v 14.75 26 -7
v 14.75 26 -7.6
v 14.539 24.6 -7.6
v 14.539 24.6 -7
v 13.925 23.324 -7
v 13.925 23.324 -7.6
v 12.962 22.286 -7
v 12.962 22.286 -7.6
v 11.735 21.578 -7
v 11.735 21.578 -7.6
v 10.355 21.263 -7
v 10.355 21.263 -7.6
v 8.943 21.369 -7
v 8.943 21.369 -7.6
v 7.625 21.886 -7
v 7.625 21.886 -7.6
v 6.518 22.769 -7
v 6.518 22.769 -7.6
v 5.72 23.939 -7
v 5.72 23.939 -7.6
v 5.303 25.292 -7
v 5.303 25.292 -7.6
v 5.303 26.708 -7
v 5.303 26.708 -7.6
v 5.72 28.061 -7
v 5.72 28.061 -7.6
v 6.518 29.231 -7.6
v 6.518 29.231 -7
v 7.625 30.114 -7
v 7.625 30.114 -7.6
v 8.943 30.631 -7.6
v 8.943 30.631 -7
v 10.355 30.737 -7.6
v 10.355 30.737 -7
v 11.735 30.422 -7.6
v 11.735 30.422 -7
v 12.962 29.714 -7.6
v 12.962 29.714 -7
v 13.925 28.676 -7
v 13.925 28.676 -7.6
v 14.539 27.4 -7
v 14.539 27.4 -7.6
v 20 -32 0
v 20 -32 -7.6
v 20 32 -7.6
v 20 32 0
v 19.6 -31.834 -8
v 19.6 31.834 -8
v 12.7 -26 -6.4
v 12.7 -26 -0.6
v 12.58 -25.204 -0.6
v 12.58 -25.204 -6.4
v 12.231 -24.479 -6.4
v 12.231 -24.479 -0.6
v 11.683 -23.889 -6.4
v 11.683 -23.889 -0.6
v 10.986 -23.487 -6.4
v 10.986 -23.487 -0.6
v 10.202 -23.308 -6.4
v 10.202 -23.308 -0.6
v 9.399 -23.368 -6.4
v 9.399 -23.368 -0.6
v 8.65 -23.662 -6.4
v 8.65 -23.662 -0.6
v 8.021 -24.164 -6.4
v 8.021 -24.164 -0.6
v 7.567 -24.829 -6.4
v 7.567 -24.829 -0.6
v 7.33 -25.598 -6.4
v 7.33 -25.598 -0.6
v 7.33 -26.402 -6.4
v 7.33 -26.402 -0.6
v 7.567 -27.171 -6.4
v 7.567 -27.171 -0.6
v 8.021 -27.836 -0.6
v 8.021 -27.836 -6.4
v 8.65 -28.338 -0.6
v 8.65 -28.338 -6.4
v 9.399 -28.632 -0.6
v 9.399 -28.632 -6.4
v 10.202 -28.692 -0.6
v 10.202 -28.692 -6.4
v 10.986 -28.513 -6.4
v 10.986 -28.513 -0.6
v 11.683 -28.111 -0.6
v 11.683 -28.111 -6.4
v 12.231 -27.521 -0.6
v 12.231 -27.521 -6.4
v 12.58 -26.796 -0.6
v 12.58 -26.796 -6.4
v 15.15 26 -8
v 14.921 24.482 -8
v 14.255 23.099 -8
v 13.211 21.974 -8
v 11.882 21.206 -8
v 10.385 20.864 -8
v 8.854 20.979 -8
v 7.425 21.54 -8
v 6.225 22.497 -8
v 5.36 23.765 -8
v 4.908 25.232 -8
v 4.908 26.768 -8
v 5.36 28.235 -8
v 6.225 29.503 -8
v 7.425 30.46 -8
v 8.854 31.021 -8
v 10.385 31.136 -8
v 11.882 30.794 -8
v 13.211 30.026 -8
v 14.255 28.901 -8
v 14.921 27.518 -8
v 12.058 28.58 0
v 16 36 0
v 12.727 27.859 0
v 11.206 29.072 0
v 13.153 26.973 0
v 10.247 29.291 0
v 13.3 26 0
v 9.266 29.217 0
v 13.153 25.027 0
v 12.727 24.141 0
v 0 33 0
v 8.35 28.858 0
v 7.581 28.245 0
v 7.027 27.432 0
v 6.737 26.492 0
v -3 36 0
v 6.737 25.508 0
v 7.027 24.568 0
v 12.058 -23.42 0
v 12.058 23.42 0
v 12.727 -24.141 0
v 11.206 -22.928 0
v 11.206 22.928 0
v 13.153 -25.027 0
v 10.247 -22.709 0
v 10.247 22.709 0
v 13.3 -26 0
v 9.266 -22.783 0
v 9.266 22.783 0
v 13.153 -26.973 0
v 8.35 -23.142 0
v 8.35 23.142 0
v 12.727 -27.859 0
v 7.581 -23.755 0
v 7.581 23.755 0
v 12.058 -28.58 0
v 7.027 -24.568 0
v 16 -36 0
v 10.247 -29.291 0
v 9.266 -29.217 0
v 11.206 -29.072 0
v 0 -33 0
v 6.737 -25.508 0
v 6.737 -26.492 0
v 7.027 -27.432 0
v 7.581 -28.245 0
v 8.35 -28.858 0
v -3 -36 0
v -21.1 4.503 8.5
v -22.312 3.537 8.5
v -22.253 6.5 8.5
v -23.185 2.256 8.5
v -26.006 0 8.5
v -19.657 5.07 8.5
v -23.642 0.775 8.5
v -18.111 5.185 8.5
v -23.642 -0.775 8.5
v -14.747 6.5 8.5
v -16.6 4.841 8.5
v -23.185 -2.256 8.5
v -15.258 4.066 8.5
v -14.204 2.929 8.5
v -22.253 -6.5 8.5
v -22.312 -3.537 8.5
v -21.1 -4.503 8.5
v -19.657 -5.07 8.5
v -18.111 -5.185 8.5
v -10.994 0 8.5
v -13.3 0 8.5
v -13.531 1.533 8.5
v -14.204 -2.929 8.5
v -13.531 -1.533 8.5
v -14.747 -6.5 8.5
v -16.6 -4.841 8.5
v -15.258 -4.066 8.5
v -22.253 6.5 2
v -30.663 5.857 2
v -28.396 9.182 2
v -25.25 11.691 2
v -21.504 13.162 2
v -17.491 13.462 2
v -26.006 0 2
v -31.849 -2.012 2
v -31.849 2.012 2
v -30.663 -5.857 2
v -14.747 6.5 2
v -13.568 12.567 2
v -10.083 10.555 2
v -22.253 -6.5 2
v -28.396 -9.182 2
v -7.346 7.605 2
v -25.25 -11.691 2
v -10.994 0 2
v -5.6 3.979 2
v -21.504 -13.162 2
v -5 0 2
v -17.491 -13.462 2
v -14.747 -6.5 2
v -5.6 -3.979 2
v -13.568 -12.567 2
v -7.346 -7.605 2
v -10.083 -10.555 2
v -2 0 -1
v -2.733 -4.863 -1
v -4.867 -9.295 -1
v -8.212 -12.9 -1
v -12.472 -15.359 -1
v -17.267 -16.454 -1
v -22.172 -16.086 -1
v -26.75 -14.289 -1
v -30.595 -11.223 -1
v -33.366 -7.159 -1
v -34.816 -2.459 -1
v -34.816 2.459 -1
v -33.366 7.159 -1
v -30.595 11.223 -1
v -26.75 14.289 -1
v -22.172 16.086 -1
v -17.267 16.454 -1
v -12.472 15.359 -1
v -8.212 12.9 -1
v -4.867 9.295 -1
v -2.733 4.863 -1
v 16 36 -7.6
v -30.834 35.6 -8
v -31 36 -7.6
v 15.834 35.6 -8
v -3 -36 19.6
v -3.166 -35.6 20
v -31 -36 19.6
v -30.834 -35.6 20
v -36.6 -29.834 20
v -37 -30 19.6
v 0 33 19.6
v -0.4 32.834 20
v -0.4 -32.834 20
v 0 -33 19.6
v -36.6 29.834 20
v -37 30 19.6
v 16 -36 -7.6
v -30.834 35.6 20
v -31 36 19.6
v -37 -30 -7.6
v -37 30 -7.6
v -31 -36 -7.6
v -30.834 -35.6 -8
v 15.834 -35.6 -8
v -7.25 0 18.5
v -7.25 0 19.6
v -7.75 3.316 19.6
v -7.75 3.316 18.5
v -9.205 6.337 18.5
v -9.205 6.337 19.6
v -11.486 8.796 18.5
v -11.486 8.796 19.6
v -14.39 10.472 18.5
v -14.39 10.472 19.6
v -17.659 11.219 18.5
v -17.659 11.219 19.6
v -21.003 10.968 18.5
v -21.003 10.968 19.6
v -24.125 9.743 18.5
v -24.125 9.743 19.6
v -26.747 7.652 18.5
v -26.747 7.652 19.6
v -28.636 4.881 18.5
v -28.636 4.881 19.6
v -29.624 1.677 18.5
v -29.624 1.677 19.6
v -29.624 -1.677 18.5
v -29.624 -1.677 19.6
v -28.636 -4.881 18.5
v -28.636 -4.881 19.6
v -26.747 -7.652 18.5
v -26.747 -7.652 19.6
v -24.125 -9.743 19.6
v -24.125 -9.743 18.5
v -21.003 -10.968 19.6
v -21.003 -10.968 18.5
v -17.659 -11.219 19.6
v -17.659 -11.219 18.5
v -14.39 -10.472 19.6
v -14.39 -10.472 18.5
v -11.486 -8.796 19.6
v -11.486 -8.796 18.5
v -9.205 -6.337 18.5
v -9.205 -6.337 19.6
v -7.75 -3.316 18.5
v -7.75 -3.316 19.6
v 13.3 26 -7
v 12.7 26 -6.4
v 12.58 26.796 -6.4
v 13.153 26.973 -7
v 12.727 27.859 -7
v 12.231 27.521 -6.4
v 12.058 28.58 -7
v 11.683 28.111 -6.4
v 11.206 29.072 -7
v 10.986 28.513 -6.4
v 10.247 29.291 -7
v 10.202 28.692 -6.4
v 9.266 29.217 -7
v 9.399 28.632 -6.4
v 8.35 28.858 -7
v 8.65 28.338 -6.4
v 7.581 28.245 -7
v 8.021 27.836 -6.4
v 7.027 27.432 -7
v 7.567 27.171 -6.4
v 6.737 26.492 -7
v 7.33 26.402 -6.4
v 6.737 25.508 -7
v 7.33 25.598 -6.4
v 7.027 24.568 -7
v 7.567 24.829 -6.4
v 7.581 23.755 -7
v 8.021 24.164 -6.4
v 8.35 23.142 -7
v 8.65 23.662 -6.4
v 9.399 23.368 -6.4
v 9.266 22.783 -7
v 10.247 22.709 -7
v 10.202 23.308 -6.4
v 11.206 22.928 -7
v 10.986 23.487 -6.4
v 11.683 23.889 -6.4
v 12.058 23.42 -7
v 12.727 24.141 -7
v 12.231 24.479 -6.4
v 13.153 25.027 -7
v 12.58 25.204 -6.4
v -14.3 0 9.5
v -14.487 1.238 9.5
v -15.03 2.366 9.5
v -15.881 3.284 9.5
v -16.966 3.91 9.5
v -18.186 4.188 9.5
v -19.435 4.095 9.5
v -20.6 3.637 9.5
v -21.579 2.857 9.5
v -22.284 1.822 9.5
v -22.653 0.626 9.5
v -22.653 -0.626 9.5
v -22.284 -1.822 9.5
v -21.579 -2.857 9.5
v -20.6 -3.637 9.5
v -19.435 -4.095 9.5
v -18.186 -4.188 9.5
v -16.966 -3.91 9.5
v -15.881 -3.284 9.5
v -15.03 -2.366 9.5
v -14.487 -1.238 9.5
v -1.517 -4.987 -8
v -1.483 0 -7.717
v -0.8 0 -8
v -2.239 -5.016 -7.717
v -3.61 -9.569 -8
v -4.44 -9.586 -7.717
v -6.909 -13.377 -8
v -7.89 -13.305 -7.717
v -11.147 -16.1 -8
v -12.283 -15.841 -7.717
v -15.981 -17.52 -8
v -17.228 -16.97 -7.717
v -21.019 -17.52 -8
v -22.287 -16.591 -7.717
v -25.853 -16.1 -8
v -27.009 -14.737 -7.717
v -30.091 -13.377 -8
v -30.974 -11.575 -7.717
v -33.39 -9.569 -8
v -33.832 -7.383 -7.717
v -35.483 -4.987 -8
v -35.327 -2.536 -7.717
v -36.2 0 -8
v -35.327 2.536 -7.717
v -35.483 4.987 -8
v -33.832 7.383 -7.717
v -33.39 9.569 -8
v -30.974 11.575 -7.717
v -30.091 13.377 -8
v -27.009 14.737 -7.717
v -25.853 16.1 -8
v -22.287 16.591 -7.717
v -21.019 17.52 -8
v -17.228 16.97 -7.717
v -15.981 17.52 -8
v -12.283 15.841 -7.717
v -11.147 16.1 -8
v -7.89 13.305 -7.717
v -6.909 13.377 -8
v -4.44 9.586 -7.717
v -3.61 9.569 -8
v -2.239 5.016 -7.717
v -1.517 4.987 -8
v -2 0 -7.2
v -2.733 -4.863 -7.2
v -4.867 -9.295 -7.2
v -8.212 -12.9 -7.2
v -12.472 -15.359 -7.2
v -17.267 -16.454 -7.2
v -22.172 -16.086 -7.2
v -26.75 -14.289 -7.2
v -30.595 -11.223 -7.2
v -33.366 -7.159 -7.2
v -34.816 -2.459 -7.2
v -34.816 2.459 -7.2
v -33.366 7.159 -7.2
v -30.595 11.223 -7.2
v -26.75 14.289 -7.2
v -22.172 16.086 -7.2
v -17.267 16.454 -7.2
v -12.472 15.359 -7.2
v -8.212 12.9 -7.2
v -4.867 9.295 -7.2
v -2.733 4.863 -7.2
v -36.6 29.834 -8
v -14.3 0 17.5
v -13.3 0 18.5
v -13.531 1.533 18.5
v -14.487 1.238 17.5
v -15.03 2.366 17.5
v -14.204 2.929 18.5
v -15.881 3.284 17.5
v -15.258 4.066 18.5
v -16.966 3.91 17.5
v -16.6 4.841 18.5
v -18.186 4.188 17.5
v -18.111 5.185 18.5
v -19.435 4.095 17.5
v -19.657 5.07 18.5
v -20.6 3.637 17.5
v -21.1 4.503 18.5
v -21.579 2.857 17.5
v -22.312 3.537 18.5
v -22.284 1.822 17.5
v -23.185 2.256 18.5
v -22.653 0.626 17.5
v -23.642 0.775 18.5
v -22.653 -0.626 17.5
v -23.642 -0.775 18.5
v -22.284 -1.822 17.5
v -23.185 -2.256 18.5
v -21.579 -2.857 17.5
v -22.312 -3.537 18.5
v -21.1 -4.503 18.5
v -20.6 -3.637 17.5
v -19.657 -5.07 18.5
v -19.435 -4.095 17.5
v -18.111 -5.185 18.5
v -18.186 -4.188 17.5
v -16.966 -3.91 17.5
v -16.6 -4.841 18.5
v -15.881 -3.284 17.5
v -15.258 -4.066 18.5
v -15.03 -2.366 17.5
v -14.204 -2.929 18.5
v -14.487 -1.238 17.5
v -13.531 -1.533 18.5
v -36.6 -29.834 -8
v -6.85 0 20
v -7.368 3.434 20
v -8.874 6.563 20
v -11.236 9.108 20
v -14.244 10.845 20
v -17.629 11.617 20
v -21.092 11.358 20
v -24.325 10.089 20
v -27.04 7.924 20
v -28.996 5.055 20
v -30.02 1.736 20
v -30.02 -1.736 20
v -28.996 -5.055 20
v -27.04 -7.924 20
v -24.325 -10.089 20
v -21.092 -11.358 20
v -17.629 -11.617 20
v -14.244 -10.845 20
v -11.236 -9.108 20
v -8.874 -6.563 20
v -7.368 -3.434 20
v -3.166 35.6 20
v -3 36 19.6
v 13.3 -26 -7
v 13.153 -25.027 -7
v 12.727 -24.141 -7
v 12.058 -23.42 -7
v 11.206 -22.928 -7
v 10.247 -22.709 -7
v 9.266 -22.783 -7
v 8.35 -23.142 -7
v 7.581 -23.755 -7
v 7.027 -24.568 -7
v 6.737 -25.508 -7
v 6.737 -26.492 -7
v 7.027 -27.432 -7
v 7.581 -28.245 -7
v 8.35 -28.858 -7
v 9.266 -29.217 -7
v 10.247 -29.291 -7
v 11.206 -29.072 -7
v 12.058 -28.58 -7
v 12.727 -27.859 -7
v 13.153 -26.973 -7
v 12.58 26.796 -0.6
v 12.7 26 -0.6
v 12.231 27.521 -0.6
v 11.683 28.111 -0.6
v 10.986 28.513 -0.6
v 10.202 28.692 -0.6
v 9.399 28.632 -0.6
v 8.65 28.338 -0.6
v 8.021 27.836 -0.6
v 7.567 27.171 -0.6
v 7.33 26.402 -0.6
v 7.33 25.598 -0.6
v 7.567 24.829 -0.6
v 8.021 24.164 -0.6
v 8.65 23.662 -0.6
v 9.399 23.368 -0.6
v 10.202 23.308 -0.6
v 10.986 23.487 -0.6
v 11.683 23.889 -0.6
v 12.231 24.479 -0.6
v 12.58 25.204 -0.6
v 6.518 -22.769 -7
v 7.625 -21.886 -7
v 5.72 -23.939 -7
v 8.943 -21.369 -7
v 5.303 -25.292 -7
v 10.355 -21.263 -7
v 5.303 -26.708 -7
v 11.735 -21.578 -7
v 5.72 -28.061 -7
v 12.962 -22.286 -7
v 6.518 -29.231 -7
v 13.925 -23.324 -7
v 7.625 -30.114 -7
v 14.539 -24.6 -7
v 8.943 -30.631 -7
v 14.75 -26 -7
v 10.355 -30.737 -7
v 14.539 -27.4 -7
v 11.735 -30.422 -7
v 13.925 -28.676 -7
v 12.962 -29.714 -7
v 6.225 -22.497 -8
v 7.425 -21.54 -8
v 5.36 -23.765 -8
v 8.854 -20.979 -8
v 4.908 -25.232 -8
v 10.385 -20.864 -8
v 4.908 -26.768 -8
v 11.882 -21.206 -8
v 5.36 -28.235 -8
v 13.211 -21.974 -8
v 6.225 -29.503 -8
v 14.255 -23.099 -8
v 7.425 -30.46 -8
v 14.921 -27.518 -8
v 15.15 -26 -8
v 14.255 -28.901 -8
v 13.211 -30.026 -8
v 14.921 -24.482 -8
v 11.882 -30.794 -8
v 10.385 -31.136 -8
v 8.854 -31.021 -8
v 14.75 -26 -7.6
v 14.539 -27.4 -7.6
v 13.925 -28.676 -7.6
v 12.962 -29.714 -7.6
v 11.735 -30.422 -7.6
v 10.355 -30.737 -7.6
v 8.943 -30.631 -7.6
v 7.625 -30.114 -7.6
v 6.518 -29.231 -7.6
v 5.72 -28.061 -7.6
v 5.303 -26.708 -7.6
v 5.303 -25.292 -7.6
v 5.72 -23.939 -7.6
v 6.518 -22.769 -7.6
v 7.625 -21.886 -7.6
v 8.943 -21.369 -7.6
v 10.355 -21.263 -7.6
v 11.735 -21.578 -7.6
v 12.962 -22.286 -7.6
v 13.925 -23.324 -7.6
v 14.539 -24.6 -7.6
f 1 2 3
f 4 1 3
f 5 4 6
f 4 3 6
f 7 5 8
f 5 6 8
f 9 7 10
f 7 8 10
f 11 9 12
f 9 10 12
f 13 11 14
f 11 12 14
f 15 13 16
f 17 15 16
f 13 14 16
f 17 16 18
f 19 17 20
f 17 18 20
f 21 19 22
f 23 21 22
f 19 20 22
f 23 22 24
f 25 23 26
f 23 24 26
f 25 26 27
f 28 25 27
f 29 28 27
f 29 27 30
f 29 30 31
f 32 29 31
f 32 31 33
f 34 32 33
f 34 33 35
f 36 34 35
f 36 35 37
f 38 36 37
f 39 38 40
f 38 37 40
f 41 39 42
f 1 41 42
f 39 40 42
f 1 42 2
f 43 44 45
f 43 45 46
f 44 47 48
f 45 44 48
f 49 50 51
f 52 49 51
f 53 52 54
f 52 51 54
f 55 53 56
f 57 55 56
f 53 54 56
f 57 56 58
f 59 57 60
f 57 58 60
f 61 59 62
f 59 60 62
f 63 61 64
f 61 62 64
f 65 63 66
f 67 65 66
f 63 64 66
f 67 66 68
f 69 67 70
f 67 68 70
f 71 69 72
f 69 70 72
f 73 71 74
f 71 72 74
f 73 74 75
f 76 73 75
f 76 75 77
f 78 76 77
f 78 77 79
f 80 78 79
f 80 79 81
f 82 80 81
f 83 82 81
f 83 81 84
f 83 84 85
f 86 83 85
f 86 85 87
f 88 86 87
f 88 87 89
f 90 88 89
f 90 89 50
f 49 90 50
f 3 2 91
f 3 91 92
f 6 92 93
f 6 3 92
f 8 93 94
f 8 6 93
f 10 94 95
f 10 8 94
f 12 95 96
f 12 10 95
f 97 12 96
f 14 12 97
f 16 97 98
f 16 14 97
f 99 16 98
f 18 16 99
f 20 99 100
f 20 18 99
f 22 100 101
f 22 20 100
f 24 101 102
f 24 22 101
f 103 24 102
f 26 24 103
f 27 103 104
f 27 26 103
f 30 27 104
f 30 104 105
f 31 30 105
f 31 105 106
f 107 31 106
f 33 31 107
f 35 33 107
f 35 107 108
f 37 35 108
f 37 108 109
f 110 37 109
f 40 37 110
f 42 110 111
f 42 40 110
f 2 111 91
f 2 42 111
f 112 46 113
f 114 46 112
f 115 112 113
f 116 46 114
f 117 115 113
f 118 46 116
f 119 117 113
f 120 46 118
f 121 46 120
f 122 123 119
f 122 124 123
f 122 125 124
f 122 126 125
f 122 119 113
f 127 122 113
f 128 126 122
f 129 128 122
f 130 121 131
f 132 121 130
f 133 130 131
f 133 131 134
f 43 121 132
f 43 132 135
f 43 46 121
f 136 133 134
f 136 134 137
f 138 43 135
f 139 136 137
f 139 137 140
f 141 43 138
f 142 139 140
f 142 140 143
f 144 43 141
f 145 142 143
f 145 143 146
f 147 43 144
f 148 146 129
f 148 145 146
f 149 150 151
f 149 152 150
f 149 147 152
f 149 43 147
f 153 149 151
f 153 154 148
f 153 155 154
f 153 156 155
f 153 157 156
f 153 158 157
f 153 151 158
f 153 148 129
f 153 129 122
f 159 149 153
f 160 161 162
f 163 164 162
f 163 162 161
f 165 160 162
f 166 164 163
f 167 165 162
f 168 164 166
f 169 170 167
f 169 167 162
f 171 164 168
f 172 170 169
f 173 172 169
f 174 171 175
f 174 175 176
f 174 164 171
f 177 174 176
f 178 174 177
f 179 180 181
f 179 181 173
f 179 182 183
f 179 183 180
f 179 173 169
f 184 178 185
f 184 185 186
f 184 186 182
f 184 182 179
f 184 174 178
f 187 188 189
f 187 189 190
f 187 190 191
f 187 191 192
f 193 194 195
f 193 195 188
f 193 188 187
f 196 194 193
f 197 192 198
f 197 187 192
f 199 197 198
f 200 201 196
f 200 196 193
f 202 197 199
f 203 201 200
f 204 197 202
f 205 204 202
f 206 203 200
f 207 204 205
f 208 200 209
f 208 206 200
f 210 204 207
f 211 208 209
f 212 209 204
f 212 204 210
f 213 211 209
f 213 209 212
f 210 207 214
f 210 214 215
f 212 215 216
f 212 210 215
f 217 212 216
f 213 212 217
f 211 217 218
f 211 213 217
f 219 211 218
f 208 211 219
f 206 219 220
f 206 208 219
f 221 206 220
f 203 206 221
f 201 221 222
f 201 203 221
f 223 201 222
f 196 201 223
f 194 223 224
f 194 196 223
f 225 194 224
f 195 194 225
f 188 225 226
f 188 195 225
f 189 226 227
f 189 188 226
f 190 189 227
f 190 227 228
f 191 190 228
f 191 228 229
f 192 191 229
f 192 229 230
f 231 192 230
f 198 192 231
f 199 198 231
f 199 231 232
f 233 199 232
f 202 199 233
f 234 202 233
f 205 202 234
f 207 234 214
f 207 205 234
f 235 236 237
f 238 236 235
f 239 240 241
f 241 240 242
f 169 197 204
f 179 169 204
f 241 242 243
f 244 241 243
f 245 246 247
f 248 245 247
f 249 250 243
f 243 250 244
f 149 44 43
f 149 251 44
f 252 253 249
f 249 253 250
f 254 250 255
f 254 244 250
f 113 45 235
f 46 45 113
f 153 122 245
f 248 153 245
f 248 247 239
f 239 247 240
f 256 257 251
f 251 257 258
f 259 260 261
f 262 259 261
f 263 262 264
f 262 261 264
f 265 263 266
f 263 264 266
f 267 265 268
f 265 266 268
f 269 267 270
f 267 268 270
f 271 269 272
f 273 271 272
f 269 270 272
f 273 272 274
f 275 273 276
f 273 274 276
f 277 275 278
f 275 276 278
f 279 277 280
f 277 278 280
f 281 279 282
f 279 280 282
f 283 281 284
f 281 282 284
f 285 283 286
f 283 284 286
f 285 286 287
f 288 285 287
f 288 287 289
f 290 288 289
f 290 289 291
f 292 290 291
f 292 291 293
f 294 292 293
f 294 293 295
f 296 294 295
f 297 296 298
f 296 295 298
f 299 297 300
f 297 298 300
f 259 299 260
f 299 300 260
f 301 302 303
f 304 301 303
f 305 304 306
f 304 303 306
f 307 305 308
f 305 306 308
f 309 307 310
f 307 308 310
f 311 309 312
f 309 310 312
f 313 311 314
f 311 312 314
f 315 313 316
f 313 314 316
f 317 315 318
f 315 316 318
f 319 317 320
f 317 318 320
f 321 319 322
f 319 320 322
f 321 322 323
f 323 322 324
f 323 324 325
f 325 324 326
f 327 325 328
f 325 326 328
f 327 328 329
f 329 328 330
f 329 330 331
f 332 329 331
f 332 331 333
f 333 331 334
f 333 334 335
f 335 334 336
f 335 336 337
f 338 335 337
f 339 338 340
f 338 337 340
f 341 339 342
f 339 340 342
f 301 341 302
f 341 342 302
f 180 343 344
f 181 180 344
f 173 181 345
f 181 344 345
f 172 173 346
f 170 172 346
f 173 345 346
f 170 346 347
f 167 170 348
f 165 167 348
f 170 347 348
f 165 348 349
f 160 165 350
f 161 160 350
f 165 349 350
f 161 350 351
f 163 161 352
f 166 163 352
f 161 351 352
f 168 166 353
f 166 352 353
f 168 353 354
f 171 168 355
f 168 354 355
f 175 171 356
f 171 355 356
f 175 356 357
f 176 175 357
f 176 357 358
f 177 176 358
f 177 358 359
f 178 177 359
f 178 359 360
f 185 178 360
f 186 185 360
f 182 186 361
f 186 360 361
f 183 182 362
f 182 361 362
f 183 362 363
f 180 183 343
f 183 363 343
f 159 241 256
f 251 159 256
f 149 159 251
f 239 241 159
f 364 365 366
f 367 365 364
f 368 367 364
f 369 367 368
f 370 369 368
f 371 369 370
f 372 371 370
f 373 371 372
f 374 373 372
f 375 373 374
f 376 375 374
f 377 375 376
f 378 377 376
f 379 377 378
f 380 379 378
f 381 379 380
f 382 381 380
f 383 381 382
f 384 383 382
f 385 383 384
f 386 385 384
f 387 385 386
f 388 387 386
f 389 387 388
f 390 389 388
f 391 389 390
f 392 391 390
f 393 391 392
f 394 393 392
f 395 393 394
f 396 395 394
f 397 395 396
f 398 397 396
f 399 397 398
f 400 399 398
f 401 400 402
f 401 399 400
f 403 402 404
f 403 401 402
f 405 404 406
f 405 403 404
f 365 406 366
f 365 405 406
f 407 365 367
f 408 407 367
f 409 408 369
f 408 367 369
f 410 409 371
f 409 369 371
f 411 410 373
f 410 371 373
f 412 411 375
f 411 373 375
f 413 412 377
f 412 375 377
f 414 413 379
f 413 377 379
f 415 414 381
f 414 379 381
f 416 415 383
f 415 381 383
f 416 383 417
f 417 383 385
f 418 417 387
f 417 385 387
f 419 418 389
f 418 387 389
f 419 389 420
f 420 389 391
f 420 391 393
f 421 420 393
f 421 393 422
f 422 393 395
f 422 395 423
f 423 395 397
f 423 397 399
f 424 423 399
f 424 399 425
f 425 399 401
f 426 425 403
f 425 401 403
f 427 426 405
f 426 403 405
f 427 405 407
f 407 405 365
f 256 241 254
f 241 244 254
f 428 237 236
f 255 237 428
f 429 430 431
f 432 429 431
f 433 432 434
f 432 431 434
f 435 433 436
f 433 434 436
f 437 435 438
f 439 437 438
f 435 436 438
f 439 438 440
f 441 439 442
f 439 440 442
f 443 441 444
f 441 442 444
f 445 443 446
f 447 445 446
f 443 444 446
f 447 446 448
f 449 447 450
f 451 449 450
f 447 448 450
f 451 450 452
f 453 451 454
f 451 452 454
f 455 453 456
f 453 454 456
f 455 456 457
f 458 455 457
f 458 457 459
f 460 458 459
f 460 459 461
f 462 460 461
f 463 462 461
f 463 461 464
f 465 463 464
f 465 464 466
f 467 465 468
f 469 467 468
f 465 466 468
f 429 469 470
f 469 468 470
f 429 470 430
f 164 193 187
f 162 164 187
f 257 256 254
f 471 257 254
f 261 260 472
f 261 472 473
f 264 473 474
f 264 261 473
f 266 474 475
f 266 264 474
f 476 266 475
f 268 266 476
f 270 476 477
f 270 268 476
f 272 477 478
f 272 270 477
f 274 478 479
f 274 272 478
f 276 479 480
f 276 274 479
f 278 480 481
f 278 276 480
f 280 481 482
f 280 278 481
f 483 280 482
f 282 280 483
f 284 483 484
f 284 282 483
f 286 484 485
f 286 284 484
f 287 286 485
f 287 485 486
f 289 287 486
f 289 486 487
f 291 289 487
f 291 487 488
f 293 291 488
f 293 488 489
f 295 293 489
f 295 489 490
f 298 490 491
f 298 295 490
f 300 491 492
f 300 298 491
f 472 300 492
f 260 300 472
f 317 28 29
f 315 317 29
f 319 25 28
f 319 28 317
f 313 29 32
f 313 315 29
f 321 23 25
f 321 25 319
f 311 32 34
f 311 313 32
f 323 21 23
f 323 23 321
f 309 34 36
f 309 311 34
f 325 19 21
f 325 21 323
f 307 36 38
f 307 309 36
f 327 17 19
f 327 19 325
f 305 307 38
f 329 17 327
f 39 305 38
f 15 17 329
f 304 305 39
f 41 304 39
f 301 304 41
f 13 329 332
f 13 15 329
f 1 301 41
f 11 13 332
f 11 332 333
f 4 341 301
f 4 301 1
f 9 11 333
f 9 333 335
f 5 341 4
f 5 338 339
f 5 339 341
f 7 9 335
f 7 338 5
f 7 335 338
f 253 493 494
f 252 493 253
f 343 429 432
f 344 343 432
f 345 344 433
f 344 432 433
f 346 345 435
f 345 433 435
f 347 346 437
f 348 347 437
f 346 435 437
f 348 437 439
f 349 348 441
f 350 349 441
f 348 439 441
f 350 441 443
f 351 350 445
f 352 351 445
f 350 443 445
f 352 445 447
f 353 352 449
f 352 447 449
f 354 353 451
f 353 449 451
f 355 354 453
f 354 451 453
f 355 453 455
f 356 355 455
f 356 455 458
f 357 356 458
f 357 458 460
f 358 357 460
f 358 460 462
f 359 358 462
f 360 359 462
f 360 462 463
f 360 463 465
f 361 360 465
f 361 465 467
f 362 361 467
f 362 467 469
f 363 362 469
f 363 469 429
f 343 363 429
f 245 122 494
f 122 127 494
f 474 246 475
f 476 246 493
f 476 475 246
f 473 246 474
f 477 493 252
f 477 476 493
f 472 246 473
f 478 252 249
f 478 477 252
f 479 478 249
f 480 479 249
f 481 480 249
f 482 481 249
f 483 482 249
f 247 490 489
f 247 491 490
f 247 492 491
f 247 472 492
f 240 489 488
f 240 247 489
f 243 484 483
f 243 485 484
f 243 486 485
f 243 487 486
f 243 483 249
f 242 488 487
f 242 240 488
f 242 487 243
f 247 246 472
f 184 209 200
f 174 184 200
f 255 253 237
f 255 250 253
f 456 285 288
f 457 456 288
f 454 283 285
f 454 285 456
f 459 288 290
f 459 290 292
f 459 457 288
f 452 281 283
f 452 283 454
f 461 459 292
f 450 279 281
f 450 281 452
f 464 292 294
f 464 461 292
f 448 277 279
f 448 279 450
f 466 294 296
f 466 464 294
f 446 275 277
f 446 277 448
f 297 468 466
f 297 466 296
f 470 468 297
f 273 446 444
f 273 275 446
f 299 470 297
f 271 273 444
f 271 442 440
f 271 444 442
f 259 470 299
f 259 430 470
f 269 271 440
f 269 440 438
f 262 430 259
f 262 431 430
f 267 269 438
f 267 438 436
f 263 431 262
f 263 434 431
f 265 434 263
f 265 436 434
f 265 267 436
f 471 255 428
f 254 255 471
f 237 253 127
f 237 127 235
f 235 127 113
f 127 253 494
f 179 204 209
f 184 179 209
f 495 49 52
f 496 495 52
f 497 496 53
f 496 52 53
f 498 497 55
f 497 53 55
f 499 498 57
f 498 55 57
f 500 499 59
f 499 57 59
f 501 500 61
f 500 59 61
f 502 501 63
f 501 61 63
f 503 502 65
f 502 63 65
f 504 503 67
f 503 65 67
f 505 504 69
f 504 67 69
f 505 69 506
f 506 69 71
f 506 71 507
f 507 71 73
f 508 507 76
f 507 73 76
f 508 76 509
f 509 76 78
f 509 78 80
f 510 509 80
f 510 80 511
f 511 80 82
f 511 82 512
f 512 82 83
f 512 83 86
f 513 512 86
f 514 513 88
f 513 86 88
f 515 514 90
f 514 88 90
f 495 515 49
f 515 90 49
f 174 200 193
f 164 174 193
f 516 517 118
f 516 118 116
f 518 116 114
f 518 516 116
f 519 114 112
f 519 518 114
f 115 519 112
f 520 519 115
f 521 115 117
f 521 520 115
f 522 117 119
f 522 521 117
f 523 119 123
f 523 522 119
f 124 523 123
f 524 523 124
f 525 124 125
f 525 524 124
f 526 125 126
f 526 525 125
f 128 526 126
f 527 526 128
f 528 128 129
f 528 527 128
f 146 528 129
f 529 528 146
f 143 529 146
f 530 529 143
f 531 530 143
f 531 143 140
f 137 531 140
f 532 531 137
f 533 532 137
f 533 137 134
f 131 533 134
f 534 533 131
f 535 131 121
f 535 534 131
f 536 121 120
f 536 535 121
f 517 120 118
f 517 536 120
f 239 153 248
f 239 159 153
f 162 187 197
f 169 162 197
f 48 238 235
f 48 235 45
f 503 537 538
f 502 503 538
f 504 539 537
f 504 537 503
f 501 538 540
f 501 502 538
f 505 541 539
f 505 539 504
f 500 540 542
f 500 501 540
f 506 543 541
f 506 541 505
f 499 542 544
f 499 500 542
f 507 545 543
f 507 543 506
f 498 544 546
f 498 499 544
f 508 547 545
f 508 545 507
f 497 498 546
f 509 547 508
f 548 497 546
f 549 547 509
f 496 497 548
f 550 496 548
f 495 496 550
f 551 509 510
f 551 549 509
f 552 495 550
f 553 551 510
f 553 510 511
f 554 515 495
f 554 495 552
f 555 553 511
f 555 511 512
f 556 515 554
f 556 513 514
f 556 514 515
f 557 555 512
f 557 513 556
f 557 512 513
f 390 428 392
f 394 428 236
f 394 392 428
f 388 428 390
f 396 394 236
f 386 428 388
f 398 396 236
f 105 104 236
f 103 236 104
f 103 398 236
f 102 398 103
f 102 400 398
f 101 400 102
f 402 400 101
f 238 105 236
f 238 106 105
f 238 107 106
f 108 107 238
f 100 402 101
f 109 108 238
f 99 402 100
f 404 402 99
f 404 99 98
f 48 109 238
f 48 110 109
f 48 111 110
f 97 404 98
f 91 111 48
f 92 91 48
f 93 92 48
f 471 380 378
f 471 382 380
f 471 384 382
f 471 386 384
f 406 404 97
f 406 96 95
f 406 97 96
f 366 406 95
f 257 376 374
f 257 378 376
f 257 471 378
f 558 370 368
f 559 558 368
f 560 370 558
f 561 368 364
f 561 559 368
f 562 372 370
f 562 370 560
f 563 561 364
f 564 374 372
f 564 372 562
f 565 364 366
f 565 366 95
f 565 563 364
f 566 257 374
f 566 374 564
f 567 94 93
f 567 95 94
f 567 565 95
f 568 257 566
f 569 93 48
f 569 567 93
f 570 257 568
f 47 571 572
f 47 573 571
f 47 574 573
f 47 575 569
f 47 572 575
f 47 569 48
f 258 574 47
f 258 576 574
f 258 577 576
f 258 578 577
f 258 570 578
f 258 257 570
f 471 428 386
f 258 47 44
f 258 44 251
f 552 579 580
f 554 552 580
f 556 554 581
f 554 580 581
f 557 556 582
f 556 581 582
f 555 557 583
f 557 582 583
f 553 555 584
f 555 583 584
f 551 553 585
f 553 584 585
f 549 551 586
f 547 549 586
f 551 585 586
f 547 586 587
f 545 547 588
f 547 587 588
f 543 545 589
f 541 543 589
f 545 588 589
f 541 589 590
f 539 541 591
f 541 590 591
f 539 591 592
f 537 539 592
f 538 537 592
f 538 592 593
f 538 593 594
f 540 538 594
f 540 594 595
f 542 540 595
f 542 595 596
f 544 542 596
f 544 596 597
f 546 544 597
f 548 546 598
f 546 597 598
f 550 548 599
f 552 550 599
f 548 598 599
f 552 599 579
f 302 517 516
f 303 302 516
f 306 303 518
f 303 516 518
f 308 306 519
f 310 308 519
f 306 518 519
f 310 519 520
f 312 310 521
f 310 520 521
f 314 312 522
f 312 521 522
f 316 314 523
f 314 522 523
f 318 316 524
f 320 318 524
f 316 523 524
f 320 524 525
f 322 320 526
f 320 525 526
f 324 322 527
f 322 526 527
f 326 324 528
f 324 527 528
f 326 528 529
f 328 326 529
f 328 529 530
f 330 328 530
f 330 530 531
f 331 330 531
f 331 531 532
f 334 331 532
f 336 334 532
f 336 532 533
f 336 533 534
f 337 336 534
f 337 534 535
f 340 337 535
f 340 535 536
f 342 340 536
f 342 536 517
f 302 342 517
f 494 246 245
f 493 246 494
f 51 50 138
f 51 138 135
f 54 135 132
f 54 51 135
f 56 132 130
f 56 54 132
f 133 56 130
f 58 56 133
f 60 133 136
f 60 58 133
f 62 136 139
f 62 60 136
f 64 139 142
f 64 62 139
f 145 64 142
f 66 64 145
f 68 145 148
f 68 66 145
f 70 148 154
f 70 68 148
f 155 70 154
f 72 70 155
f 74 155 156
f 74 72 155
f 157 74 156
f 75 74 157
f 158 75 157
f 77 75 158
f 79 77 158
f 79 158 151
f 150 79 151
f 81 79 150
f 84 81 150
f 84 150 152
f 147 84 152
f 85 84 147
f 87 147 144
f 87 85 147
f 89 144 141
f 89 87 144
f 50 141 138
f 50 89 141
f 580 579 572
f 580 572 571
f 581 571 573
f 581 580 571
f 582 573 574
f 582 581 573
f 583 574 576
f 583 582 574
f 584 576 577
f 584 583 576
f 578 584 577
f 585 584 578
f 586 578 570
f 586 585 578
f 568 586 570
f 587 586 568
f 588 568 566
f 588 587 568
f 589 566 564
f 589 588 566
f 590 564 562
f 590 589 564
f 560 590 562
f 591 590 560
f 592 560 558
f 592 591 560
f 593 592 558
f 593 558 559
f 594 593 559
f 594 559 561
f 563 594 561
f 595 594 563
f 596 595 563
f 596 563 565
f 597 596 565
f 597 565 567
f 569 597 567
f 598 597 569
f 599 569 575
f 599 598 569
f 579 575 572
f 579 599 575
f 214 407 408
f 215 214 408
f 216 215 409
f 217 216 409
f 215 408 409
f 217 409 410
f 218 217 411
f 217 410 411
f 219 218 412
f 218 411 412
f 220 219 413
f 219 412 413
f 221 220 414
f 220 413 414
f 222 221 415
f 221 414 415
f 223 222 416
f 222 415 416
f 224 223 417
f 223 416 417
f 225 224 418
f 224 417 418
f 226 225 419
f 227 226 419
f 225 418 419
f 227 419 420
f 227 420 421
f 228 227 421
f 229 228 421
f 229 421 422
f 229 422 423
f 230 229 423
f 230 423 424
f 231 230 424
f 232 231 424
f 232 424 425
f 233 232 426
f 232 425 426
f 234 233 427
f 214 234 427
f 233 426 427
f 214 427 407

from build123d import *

# Parameters (mm, degrees)
PAD_DEPTH       = 36
SKETCH001_R     = 4.2
POCKET_DEPTH    = 28.001
SKETCH002_R     = 16.5
POCKET001_DEPTH = 10
POCKET002_DEPTH = 6.5
SKETCH004_R     = 11.25
POCKET003_DEPTH = 1.5
SKETCH005_R     = 2.7
POCKET004_DEPTH = 10
SKETCH006_R     = 4.75
POCKET005_DEPTH = 1
CHAMFER_SIZE    = 3
CHAMFER001_SIZE = 4
CHAMFER002_SIZE = 6
CHAMFER003_SIZE = 3
CHAMFER004_SIZE = 0.8
CHAMFER005_SIZE = 1
CHAMFER006_SIZE = 0.6
CHAMFER007_SIZE = 0.4


with BuildPart() as part:
    # Sketch (on XZ_Plane of Origin) → Pad (new body, symmetric)
    with BuildSketch(Plane.XZ):
        Polygon((0, 0), (0, 20), (-37, 20), (-37, -8), (20, -8), (20, 0), align=None)
    extrude(amount=PAD_DEPTH, both=True)

    # Sketch001 (on Face2 of Pad) → Pocket (cut, through all)
    with BuildSketch(Plane.XY.offset(20)):
        with Locations((-18.5, 0)):
            Circle(SKETCH001_R)
    extrude(amount=-POCKET_DEPTH, mode=Mode.SUBTRACT)

    # Sketch002 (on Face9 of Pocket) → Pocket001 (cut)
    with BuildSketch(Plane(origin=(0, 0, -8), x_dir=(1, 0, 0), z_dir=(0, 0, -1))):
        with Locations((-18.5, 0)):
            Circle(SKETCH002_R)
    extrude(amount=-POCKET001_DEPTH, mode=Mode.SUBTRACT)

    # Sketch003 (on Face10 of Pocket001) → Pocket002 (cut)
    with BuildSketch(Plane(origin=(0, 0, 2), x_dir=(1, 0, 0), z_dir=(0, 0, -1))):
        Polygon((-10.994447, 0), (-14.747223, 6.5), (-22.252777, 6.5), (-26.005553, 0), (-22.252777, -6.5), (-14.747223, -6.5), align=None)
    extrude(amount=-POCKET002_DEPTH, mode=Mode.SUBTRACT)

    # Sketch004 (on Face3 of Pocket002) → Pocket003 (cut)
    with BuildSketch(Plane.XY.offset(20)):
        with Locations((-18.5, 0)):
            Circle(SKETCH004_R)
    extrude(amount=-POCKET003_DEPTH, mode=Mode.SUBTRACT)

    # Sketch005 (on Face2 of Pocket003) → Pocket004 (cut)
    with BuildSketch(Plane.XY):
        with Locations((10, -26)):
            Circle(SKETCH005_R)
        with Locations((10, 26)):
            Circle(SKETCH005_R)
    extrude(amount=-POCKET004_DEPTH, mode=Mode.SUBTRACT)

    # Sketch006 (on Face11 of Pocket004) → Pocket005 (cut)
    with BuildSketch(Plane(origin=(0, 0, -8), x_dir=(1, 0, 0), z_dir=(0, 0, -1))):
        with Locations((10, 26)):
            Circle(SKETCH006_R)
        with Locations((10, -26)):
            Circle(SKETCH006_R)
    extrude(amount=-POCKET005_DEPTH, mode=Mode.SUBTRACT)

    # Chamfer
    chamfer_edges = [part.edges().sort_by_distance(p)[0] for p in [
        (0, -36, 10),
        (0, 36, 10),
    ]]
    chamfer(chamfer_edges, length=CHAMFER_SIZE)

    # Chamfer001
    chamfer001_edges = [part.edges().sort_by_distance(p)[0] for p in [
        (20, -36, -4),
        (20, 36, -4),
    ]]
    chamfer(chamfer001_edges, length=CHAMFER001_SIZE)

    # Chamfer002
    chamfer002_edges = [part.edges().sort_by_distance(p)[0] for p in [
        (-37, -36, 6),
        (-37, 36, 6),
    ]]
    chamfer(chamfer002_edges, length=CHAMFER002_SIZE)

    # Chamfer003
    chamfer003_edges = [part.edges().sort_by_distance(p)[0] for p in [
        (-35, 0, 2),
    ]]
    chamfer(chamfer003_edges, length=CHAMFER003_SIZE)

    # Chamfer004
    chamfer004_edges = [part.edges().sort_by_distance(p)[0] for p in [
        (-35, 0, -8),
    ]]
    chamfer(chamfer004_edges, length=CHAMFER004_SIZE)

    # Chamfer005
    chamfer005_edges = [part.edges().sort_by_distance(p)[0] for p in [
        (-22.7, 0, 18.5),
        (-22.7, 0, 8.5),
    ]]
    chamfer(chamfer005_edges, length=CHAMFER005_SIZE)

    # Chamfer006
    chamfer006_edges = [part.edges().sort_by_distance(p)[0] for p in [
        (7.3, 26, -7),
        (7.3, -26, -7),
        (7.3, -26, 0),
        (7.3, 26, 0),
    ]]
    chamfer(chamfer006_edges, length=CHAMFER006_SIZE)

    # Chamfer007
    chamfer007_edges = [part.edges().sort_by_distance(p)[0] for p in [
        (-17, 36, 20),
        (-34, 33, 20),
        (-1.5, 34.5, 20),
        (-37, 0, 20),
        (0, 0, 20),
        (-34, -33, 20),
        (-1.5, -34.5, 20),
        (-17, -36, 20),
        (-29.75, 0, 20),
        (-35.8, 0, -8),
        (-7.5, 36, -8),
        (-34, 33, -8),
        (18, 34, -8),
        (-37, 0, -8),
        (20, 0, -8),
        (-34, -33, -8),
        (18, -34, -8),
        (-7.5, -36, -8),
        (5.25, -26, -8),
        (5.25, 26, -8),
    ]]
    chamfer(chamfer007_edges, length=CHAMFER007_SIZE)


solid = part.part
